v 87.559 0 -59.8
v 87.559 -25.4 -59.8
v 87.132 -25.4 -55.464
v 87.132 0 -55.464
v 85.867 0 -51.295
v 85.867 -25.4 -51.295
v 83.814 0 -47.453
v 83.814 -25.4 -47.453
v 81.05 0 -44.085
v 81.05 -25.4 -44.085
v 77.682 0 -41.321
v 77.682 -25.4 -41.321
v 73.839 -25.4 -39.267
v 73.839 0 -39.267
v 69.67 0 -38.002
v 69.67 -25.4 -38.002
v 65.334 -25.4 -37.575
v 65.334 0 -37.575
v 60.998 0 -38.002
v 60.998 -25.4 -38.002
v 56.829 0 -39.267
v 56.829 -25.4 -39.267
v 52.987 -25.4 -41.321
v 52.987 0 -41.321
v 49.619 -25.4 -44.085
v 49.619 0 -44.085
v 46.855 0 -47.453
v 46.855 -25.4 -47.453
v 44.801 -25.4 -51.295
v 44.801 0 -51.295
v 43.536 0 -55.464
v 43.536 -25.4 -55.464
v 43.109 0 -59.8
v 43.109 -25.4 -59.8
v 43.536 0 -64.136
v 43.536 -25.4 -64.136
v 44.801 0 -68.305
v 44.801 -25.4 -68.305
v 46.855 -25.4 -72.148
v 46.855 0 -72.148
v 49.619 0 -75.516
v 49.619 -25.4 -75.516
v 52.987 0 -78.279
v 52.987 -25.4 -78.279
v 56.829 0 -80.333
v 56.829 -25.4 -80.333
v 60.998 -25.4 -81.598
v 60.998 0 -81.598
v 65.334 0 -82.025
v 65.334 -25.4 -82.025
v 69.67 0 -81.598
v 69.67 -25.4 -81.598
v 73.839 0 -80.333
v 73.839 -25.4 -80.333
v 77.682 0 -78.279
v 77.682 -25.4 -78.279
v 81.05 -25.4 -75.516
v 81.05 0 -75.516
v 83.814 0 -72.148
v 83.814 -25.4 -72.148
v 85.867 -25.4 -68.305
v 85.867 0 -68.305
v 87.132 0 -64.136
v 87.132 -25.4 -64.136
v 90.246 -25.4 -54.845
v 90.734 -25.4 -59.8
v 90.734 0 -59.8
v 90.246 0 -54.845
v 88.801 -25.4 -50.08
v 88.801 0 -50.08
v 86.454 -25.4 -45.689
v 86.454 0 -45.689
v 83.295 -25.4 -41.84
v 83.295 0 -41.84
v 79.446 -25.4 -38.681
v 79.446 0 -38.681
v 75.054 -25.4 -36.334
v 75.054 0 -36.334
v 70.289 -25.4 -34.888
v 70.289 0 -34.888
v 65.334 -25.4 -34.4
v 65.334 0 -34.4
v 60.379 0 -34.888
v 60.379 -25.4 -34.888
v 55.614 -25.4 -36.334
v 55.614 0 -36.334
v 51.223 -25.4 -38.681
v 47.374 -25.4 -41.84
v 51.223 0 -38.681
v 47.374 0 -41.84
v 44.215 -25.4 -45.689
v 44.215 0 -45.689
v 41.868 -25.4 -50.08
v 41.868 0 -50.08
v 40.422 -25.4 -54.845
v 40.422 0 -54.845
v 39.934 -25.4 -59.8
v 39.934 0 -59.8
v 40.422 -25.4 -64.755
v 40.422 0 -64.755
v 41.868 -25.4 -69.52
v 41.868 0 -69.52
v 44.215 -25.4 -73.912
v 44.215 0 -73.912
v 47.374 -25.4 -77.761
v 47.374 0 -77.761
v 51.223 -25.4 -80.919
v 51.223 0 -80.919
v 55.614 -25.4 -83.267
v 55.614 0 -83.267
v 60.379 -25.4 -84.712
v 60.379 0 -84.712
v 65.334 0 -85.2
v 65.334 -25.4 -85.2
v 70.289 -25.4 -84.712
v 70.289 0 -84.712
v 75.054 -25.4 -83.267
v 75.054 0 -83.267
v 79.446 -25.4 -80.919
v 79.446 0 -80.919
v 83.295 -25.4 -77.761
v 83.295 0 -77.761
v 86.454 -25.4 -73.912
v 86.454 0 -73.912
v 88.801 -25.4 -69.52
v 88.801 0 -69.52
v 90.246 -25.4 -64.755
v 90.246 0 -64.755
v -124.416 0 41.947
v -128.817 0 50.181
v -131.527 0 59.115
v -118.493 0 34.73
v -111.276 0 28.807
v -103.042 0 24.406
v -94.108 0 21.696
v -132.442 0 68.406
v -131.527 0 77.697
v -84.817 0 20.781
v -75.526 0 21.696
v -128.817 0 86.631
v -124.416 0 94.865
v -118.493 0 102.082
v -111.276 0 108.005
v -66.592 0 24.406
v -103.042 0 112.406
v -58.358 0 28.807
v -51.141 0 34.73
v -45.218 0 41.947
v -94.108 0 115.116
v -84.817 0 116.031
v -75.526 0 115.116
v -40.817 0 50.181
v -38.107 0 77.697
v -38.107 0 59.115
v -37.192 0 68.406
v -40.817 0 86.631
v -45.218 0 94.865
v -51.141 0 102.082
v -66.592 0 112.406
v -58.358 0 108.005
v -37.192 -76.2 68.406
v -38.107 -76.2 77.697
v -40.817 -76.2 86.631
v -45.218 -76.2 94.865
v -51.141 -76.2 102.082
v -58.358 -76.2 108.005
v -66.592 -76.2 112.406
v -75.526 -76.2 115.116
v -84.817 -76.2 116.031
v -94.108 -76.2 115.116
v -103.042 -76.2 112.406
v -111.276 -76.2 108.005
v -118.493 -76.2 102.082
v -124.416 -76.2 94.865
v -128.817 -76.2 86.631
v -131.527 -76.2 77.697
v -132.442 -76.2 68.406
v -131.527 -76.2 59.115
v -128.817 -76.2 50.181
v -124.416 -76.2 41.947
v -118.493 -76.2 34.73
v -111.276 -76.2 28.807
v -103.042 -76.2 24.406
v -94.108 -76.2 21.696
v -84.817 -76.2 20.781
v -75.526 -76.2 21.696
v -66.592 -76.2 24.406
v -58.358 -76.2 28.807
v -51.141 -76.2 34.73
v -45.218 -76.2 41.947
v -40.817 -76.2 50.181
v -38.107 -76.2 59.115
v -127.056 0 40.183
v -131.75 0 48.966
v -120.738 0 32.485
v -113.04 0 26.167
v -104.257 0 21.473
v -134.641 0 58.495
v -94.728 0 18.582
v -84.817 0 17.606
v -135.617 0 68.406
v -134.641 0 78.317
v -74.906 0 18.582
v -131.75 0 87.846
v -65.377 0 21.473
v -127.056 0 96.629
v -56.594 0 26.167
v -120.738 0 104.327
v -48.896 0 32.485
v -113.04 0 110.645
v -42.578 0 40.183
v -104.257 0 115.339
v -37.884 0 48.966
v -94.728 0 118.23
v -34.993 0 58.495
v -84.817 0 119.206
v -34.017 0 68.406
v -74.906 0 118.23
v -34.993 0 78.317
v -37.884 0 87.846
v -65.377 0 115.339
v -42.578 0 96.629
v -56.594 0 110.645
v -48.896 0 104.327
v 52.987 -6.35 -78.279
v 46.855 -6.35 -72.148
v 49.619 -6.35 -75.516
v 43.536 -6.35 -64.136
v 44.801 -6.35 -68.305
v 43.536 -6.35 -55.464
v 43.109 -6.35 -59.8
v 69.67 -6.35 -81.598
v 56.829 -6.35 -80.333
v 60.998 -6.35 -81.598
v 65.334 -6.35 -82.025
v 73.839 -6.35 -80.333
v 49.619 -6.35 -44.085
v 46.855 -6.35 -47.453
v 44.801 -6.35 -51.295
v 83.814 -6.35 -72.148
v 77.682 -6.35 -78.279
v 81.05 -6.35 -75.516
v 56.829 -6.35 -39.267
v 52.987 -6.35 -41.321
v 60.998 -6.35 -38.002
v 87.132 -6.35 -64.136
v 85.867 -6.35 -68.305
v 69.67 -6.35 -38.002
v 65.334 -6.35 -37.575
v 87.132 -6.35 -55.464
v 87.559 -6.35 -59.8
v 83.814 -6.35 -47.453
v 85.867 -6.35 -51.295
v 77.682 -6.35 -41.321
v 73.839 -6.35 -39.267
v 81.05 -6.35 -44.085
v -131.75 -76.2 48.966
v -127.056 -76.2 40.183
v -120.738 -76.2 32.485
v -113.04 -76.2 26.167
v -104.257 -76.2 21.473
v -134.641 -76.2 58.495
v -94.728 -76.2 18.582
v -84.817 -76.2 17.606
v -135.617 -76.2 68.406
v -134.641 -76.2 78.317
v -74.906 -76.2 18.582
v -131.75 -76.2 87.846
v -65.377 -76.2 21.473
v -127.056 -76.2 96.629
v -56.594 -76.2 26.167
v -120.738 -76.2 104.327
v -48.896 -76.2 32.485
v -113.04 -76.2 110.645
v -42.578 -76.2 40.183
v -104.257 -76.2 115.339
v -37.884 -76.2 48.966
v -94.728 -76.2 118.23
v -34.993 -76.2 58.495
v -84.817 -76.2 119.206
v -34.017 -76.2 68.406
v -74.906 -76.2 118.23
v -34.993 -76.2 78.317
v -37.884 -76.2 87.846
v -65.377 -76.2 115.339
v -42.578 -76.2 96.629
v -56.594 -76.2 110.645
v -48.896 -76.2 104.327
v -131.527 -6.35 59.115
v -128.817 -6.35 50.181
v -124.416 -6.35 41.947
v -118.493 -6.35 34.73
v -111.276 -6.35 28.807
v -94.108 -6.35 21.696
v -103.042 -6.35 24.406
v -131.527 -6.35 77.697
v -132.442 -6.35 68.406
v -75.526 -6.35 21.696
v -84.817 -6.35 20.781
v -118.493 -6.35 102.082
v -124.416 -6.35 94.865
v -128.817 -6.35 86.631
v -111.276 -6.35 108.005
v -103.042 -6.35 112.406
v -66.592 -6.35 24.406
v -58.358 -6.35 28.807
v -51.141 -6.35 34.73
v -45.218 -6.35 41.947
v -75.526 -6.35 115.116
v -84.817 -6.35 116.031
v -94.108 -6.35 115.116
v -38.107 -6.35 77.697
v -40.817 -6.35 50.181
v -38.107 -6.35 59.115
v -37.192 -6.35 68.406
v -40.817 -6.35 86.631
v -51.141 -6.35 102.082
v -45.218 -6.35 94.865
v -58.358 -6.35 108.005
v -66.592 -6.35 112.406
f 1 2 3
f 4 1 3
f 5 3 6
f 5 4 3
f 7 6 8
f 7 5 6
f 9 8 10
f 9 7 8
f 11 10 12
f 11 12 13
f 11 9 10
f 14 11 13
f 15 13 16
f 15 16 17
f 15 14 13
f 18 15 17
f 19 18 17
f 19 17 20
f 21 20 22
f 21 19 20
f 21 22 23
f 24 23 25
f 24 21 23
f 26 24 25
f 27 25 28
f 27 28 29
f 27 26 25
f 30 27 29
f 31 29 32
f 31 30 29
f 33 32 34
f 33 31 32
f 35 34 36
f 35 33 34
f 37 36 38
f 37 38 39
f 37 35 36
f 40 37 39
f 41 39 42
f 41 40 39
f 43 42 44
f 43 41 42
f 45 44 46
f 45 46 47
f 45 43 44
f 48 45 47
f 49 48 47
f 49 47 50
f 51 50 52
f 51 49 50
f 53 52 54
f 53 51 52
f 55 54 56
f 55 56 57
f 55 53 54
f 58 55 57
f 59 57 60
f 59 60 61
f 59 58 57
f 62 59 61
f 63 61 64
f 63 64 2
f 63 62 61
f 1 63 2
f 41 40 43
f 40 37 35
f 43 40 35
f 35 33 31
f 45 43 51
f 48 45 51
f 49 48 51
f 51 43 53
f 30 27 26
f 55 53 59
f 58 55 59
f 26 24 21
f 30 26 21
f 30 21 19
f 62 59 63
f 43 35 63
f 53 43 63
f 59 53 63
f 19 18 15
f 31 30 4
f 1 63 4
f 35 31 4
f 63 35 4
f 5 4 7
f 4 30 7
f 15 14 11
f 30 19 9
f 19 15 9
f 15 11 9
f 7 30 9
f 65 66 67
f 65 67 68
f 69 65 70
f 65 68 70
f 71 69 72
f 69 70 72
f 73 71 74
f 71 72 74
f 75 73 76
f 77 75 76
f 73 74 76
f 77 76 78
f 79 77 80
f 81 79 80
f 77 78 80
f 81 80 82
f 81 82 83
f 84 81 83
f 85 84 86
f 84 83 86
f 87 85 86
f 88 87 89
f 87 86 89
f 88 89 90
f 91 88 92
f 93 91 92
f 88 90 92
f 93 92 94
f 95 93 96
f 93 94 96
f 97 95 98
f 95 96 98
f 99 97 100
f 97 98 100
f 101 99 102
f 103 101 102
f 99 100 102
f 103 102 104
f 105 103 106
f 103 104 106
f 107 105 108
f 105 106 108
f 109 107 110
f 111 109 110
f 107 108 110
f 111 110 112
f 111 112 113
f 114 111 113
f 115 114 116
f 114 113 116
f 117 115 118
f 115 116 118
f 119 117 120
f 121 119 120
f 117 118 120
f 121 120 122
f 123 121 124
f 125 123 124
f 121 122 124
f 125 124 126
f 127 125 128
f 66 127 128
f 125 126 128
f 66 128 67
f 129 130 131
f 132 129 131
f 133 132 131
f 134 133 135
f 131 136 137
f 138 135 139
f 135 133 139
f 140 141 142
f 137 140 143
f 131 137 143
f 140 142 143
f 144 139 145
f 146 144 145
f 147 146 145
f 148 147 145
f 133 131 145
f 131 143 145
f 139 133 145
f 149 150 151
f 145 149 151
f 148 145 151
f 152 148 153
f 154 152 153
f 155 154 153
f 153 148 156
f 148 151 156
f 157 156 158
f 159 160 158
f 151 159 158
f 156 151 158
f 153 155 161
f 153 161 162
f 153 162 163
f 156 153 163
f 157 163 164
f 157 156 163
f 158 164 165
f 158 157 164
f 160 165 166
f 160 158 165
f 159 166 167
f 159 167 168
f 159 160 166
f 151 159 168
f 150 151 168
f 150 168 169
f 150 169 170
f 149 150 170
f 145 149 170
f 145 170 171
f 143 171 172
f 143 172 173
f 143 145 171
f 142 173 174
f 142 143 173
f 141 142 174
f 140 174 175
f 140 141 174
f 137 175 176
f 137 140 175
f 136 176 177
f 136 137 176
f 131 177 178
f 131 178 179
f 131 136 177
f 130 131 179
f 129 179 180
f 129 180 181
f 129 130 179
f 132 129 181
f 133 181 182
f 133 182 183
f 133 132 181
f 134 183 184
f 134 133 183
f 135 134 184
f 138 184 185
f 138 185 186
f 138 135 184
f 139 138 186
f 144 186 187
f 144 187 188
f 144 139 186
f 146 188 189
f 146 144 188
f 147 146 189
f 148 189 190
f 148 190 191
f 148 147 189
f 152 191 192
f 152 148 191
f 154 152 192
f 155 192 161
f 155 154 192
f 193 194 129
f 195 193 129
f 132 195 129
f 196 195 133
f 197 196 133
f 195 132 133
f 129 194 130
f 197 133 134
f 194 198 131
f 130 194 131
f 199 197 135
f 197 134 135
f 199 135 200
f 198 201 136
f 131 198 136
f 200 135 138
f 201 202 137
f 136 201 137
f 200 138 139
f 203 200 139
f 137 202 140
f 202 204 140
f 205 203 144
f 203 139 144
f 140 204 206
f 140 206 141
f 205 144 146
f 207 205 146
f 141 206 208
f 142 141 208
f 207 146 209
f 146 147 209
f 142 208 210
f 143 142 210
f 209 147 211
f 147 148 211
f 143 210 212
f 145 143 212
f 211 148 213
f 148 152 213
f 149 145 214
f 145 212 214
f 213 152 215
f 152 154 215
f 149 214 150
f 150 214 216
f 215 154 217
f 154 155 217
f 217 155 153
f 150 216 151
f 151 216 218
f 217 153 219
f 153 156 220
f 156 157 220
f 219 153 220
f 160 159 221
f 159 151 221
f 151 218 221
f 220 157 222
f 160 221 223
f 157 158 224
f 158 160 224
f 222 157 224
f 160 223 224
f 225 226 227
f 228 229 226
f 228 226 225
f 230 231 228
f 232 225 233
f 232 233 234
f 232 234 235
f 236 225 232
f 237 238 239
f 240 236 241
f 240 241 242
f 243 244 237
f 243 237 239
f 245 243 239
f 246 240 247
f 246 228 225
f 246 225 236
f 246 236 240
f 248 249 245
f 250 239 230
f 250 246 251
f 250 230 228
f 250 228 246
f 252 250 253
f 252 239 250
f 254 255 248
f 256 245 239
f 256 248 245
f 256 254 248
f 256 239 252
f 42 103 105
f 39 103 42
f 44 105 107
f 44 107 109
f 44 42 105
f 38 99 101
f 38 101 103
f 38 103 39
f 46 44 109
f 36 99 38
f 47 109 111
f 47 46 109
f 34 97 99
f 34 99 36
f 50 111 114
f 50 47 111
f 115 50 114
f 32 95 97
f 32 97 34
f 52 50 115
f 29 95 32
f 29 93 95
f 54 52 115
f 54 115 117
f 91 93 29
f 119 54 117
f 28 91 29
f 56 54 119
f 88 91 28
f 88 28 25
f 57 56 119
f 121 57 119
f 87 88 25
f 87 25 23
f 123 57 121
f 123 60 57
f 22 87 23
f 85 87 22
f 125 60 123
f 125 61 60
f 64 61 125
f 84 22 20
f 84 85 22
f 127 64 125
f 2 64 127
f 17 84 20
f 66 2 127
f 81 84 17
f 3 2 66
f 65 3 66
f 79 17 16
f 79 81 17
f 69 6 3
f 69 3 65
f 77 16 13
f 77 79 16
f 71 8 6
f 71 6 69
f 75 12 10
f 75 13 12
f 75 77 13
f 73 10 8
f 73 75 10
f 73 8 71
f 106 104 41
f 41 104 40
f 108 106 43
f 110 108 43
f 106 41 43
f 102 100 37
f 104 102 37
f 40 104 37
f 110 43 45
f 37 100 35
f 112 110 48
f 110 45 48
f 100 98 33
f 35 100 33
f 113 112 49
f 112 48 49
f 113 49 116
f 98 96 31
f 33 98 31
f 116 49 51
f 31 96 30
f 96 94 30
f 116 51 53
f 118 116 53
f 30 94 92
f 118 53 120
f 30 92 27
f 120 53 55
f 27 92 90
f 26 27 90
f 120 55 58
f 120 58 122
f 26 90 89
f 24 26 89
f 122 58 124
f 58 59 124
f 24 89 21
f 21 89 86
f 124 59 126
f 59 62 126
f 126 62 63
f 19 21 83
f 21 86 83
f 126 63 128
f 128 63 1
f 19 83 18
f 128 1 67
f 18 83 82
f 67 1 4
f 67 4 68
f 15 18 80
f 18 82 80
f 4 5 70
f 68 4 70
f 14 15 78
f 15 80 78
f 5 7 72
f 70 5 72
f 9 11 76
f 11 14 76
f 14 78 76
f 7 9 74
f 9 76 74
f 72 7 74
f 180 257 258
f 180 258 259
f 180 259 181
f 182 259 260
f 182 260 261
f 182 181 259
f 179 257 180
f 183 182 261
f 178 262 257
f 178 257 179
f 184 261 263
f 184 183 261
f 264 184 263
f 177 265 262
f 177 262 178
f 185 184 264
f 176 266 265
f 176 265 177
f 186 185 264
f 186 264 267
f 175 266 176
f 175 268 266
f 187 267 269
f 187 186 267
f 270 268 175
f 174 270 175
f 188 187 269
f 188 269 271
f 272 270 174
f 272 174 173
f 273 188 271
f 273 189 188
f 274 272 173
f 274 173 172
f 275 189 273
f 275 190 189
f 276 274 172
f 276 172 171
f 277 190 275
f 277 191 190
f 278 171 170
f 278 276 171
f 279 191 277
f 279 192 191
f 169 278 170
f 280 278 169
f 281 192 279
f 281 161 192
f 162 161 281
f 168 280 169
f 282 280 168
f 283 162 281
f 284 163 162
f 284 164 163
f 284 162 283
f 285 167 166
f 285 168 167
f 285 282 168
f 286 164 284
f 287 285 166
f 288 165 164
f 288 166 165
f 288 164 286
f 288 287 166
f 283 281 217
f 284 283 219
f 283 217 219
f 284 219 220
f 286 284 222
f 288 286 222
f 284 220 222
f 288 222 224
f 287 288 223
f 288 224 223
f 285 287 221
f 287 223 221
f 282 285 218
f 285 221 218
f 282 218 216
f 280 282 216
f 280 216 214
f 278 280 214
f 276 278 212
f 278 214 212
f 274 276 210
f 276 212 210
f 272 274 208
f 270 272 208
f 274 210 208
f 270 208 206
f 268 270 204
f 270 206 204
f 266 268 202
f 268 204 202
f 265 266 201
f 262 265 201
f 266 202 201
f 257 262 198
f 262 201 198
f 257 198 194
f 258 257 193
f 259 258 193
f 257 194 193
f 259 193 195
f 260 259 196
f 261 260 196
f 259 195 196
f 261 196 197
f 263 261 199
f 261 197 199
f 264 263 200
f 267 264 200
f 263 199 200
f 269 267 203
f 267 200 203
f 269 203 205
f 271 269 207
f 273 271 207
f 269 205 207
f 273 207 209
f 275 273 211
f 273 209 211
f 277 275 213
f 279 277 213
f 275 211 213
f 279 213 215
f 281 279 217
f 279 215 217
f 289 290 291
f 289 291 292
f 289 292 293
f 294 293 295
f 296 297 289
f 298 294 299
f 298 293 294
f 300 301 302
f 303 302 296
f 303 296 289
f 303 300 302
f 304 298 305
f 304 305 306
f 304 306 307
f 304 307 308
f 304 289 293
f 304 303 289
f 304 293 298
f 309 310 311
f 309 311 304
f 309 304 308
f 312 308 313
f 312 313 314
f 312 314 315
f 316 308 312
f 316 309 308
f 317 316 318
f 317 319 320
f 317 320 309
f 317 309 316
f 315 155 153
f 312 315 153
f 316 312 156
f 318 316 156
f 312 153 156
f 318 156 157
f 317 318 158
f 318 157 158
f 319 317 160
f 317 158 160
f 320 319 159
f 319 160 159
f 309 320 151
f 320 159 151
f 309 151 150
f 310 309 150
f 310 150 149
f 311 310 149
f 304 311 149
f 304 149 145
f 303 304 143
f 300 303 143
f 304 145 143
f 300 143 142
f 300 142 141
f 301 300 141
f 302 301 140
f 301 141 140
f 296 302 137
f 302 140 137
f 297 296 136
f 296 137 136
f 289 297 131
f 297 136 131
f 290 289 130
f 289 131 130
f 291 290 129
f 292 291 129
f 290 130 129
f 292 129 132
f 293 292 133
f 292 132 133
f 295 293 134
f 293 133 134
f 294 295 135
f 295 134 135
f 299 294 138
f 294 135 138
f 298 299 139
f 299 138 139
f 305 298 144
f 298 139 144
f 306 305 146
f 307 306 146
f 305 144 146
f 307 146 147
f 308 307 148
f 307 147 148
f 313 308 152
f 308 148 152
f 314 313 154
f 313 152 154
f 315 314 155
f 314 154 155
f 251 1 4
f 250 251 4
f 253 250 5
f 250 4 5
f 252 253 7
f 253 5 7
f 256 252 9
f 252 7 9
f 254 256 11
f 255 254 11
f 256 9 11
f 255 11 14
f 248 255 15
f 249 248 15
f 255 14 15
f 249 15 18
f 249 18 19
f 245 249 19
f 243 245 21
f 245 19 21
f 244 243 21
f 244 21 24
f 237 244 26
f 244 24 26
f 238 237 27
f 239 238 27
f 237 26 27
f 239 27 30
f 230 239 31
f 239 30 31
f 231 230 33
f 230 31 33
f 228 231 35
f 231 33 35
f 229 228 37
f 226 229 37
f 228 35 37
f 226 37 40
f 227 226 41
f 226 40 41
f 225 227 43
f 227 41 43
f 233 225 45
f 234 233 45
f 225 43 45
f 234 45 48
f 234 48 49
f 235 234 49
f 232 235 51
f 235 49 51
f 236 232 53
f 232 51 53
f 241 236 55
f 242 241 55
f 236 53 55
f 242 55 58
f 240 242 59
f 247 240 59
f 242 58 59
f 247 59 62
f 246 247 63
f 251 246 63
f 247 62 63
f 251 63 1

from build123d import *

# Parameters (mm, degrees)
F0_R     = 50.8
F0_R_2   = 47.625
F1_DEPTH = 76.2
F2_DEPTH = 6.35
F0_R_3   = 22.225
F3_DEPTH = 6.35
F0_R_4   = 25.4
F4_DEPTH = 25.4


with BuildPart() as f1:
    # F0 (on Front) → F1 (new body)
    with BuildSketch(Plane.XZ):
        with Locations((-84.817045, 68.405986)):
            Circle(F0_R)
        with Locations((-84.817045, 68.405986)):
            Circle(F0_R_2, mode=Mode.SUBTRACT)
    extrude(amount=F1_DEPTH)


with BuildPart() as f2:
    # F0 (on Front) → F2 (new body)
    with BuildSketch(Plane.XZ):
        with Locations((-84.817045, 68.405986)):
            Circle(F0_R_2)
    extrude(amount=F2_DEPTH)


with BuildPart() as f3:
    # F0 (on Front) → F3 (new body)
    with BuildSketch(Plane.XZ):
        with Locations((65.33419, -59.800068)):
            Circle(F0_R_3)
    extrude(amount=F3_DEPTH)


with BuildPart() as f4:
    # F0 (on Front) → F4 (new body)
    with BuildSketch(Plane.XZ):
        with Locations((65.33419, -59.800068)):
            Circle(F0_R_4)
        with Locations((65.33419, -59.800068)):
            Circle(F0_R_3, mode=Mode.SUBTRACT)
    extrude(amount=F4_DEPTH)


solid = Compound([f1.part, f2.part, f3.part, f4.part])
